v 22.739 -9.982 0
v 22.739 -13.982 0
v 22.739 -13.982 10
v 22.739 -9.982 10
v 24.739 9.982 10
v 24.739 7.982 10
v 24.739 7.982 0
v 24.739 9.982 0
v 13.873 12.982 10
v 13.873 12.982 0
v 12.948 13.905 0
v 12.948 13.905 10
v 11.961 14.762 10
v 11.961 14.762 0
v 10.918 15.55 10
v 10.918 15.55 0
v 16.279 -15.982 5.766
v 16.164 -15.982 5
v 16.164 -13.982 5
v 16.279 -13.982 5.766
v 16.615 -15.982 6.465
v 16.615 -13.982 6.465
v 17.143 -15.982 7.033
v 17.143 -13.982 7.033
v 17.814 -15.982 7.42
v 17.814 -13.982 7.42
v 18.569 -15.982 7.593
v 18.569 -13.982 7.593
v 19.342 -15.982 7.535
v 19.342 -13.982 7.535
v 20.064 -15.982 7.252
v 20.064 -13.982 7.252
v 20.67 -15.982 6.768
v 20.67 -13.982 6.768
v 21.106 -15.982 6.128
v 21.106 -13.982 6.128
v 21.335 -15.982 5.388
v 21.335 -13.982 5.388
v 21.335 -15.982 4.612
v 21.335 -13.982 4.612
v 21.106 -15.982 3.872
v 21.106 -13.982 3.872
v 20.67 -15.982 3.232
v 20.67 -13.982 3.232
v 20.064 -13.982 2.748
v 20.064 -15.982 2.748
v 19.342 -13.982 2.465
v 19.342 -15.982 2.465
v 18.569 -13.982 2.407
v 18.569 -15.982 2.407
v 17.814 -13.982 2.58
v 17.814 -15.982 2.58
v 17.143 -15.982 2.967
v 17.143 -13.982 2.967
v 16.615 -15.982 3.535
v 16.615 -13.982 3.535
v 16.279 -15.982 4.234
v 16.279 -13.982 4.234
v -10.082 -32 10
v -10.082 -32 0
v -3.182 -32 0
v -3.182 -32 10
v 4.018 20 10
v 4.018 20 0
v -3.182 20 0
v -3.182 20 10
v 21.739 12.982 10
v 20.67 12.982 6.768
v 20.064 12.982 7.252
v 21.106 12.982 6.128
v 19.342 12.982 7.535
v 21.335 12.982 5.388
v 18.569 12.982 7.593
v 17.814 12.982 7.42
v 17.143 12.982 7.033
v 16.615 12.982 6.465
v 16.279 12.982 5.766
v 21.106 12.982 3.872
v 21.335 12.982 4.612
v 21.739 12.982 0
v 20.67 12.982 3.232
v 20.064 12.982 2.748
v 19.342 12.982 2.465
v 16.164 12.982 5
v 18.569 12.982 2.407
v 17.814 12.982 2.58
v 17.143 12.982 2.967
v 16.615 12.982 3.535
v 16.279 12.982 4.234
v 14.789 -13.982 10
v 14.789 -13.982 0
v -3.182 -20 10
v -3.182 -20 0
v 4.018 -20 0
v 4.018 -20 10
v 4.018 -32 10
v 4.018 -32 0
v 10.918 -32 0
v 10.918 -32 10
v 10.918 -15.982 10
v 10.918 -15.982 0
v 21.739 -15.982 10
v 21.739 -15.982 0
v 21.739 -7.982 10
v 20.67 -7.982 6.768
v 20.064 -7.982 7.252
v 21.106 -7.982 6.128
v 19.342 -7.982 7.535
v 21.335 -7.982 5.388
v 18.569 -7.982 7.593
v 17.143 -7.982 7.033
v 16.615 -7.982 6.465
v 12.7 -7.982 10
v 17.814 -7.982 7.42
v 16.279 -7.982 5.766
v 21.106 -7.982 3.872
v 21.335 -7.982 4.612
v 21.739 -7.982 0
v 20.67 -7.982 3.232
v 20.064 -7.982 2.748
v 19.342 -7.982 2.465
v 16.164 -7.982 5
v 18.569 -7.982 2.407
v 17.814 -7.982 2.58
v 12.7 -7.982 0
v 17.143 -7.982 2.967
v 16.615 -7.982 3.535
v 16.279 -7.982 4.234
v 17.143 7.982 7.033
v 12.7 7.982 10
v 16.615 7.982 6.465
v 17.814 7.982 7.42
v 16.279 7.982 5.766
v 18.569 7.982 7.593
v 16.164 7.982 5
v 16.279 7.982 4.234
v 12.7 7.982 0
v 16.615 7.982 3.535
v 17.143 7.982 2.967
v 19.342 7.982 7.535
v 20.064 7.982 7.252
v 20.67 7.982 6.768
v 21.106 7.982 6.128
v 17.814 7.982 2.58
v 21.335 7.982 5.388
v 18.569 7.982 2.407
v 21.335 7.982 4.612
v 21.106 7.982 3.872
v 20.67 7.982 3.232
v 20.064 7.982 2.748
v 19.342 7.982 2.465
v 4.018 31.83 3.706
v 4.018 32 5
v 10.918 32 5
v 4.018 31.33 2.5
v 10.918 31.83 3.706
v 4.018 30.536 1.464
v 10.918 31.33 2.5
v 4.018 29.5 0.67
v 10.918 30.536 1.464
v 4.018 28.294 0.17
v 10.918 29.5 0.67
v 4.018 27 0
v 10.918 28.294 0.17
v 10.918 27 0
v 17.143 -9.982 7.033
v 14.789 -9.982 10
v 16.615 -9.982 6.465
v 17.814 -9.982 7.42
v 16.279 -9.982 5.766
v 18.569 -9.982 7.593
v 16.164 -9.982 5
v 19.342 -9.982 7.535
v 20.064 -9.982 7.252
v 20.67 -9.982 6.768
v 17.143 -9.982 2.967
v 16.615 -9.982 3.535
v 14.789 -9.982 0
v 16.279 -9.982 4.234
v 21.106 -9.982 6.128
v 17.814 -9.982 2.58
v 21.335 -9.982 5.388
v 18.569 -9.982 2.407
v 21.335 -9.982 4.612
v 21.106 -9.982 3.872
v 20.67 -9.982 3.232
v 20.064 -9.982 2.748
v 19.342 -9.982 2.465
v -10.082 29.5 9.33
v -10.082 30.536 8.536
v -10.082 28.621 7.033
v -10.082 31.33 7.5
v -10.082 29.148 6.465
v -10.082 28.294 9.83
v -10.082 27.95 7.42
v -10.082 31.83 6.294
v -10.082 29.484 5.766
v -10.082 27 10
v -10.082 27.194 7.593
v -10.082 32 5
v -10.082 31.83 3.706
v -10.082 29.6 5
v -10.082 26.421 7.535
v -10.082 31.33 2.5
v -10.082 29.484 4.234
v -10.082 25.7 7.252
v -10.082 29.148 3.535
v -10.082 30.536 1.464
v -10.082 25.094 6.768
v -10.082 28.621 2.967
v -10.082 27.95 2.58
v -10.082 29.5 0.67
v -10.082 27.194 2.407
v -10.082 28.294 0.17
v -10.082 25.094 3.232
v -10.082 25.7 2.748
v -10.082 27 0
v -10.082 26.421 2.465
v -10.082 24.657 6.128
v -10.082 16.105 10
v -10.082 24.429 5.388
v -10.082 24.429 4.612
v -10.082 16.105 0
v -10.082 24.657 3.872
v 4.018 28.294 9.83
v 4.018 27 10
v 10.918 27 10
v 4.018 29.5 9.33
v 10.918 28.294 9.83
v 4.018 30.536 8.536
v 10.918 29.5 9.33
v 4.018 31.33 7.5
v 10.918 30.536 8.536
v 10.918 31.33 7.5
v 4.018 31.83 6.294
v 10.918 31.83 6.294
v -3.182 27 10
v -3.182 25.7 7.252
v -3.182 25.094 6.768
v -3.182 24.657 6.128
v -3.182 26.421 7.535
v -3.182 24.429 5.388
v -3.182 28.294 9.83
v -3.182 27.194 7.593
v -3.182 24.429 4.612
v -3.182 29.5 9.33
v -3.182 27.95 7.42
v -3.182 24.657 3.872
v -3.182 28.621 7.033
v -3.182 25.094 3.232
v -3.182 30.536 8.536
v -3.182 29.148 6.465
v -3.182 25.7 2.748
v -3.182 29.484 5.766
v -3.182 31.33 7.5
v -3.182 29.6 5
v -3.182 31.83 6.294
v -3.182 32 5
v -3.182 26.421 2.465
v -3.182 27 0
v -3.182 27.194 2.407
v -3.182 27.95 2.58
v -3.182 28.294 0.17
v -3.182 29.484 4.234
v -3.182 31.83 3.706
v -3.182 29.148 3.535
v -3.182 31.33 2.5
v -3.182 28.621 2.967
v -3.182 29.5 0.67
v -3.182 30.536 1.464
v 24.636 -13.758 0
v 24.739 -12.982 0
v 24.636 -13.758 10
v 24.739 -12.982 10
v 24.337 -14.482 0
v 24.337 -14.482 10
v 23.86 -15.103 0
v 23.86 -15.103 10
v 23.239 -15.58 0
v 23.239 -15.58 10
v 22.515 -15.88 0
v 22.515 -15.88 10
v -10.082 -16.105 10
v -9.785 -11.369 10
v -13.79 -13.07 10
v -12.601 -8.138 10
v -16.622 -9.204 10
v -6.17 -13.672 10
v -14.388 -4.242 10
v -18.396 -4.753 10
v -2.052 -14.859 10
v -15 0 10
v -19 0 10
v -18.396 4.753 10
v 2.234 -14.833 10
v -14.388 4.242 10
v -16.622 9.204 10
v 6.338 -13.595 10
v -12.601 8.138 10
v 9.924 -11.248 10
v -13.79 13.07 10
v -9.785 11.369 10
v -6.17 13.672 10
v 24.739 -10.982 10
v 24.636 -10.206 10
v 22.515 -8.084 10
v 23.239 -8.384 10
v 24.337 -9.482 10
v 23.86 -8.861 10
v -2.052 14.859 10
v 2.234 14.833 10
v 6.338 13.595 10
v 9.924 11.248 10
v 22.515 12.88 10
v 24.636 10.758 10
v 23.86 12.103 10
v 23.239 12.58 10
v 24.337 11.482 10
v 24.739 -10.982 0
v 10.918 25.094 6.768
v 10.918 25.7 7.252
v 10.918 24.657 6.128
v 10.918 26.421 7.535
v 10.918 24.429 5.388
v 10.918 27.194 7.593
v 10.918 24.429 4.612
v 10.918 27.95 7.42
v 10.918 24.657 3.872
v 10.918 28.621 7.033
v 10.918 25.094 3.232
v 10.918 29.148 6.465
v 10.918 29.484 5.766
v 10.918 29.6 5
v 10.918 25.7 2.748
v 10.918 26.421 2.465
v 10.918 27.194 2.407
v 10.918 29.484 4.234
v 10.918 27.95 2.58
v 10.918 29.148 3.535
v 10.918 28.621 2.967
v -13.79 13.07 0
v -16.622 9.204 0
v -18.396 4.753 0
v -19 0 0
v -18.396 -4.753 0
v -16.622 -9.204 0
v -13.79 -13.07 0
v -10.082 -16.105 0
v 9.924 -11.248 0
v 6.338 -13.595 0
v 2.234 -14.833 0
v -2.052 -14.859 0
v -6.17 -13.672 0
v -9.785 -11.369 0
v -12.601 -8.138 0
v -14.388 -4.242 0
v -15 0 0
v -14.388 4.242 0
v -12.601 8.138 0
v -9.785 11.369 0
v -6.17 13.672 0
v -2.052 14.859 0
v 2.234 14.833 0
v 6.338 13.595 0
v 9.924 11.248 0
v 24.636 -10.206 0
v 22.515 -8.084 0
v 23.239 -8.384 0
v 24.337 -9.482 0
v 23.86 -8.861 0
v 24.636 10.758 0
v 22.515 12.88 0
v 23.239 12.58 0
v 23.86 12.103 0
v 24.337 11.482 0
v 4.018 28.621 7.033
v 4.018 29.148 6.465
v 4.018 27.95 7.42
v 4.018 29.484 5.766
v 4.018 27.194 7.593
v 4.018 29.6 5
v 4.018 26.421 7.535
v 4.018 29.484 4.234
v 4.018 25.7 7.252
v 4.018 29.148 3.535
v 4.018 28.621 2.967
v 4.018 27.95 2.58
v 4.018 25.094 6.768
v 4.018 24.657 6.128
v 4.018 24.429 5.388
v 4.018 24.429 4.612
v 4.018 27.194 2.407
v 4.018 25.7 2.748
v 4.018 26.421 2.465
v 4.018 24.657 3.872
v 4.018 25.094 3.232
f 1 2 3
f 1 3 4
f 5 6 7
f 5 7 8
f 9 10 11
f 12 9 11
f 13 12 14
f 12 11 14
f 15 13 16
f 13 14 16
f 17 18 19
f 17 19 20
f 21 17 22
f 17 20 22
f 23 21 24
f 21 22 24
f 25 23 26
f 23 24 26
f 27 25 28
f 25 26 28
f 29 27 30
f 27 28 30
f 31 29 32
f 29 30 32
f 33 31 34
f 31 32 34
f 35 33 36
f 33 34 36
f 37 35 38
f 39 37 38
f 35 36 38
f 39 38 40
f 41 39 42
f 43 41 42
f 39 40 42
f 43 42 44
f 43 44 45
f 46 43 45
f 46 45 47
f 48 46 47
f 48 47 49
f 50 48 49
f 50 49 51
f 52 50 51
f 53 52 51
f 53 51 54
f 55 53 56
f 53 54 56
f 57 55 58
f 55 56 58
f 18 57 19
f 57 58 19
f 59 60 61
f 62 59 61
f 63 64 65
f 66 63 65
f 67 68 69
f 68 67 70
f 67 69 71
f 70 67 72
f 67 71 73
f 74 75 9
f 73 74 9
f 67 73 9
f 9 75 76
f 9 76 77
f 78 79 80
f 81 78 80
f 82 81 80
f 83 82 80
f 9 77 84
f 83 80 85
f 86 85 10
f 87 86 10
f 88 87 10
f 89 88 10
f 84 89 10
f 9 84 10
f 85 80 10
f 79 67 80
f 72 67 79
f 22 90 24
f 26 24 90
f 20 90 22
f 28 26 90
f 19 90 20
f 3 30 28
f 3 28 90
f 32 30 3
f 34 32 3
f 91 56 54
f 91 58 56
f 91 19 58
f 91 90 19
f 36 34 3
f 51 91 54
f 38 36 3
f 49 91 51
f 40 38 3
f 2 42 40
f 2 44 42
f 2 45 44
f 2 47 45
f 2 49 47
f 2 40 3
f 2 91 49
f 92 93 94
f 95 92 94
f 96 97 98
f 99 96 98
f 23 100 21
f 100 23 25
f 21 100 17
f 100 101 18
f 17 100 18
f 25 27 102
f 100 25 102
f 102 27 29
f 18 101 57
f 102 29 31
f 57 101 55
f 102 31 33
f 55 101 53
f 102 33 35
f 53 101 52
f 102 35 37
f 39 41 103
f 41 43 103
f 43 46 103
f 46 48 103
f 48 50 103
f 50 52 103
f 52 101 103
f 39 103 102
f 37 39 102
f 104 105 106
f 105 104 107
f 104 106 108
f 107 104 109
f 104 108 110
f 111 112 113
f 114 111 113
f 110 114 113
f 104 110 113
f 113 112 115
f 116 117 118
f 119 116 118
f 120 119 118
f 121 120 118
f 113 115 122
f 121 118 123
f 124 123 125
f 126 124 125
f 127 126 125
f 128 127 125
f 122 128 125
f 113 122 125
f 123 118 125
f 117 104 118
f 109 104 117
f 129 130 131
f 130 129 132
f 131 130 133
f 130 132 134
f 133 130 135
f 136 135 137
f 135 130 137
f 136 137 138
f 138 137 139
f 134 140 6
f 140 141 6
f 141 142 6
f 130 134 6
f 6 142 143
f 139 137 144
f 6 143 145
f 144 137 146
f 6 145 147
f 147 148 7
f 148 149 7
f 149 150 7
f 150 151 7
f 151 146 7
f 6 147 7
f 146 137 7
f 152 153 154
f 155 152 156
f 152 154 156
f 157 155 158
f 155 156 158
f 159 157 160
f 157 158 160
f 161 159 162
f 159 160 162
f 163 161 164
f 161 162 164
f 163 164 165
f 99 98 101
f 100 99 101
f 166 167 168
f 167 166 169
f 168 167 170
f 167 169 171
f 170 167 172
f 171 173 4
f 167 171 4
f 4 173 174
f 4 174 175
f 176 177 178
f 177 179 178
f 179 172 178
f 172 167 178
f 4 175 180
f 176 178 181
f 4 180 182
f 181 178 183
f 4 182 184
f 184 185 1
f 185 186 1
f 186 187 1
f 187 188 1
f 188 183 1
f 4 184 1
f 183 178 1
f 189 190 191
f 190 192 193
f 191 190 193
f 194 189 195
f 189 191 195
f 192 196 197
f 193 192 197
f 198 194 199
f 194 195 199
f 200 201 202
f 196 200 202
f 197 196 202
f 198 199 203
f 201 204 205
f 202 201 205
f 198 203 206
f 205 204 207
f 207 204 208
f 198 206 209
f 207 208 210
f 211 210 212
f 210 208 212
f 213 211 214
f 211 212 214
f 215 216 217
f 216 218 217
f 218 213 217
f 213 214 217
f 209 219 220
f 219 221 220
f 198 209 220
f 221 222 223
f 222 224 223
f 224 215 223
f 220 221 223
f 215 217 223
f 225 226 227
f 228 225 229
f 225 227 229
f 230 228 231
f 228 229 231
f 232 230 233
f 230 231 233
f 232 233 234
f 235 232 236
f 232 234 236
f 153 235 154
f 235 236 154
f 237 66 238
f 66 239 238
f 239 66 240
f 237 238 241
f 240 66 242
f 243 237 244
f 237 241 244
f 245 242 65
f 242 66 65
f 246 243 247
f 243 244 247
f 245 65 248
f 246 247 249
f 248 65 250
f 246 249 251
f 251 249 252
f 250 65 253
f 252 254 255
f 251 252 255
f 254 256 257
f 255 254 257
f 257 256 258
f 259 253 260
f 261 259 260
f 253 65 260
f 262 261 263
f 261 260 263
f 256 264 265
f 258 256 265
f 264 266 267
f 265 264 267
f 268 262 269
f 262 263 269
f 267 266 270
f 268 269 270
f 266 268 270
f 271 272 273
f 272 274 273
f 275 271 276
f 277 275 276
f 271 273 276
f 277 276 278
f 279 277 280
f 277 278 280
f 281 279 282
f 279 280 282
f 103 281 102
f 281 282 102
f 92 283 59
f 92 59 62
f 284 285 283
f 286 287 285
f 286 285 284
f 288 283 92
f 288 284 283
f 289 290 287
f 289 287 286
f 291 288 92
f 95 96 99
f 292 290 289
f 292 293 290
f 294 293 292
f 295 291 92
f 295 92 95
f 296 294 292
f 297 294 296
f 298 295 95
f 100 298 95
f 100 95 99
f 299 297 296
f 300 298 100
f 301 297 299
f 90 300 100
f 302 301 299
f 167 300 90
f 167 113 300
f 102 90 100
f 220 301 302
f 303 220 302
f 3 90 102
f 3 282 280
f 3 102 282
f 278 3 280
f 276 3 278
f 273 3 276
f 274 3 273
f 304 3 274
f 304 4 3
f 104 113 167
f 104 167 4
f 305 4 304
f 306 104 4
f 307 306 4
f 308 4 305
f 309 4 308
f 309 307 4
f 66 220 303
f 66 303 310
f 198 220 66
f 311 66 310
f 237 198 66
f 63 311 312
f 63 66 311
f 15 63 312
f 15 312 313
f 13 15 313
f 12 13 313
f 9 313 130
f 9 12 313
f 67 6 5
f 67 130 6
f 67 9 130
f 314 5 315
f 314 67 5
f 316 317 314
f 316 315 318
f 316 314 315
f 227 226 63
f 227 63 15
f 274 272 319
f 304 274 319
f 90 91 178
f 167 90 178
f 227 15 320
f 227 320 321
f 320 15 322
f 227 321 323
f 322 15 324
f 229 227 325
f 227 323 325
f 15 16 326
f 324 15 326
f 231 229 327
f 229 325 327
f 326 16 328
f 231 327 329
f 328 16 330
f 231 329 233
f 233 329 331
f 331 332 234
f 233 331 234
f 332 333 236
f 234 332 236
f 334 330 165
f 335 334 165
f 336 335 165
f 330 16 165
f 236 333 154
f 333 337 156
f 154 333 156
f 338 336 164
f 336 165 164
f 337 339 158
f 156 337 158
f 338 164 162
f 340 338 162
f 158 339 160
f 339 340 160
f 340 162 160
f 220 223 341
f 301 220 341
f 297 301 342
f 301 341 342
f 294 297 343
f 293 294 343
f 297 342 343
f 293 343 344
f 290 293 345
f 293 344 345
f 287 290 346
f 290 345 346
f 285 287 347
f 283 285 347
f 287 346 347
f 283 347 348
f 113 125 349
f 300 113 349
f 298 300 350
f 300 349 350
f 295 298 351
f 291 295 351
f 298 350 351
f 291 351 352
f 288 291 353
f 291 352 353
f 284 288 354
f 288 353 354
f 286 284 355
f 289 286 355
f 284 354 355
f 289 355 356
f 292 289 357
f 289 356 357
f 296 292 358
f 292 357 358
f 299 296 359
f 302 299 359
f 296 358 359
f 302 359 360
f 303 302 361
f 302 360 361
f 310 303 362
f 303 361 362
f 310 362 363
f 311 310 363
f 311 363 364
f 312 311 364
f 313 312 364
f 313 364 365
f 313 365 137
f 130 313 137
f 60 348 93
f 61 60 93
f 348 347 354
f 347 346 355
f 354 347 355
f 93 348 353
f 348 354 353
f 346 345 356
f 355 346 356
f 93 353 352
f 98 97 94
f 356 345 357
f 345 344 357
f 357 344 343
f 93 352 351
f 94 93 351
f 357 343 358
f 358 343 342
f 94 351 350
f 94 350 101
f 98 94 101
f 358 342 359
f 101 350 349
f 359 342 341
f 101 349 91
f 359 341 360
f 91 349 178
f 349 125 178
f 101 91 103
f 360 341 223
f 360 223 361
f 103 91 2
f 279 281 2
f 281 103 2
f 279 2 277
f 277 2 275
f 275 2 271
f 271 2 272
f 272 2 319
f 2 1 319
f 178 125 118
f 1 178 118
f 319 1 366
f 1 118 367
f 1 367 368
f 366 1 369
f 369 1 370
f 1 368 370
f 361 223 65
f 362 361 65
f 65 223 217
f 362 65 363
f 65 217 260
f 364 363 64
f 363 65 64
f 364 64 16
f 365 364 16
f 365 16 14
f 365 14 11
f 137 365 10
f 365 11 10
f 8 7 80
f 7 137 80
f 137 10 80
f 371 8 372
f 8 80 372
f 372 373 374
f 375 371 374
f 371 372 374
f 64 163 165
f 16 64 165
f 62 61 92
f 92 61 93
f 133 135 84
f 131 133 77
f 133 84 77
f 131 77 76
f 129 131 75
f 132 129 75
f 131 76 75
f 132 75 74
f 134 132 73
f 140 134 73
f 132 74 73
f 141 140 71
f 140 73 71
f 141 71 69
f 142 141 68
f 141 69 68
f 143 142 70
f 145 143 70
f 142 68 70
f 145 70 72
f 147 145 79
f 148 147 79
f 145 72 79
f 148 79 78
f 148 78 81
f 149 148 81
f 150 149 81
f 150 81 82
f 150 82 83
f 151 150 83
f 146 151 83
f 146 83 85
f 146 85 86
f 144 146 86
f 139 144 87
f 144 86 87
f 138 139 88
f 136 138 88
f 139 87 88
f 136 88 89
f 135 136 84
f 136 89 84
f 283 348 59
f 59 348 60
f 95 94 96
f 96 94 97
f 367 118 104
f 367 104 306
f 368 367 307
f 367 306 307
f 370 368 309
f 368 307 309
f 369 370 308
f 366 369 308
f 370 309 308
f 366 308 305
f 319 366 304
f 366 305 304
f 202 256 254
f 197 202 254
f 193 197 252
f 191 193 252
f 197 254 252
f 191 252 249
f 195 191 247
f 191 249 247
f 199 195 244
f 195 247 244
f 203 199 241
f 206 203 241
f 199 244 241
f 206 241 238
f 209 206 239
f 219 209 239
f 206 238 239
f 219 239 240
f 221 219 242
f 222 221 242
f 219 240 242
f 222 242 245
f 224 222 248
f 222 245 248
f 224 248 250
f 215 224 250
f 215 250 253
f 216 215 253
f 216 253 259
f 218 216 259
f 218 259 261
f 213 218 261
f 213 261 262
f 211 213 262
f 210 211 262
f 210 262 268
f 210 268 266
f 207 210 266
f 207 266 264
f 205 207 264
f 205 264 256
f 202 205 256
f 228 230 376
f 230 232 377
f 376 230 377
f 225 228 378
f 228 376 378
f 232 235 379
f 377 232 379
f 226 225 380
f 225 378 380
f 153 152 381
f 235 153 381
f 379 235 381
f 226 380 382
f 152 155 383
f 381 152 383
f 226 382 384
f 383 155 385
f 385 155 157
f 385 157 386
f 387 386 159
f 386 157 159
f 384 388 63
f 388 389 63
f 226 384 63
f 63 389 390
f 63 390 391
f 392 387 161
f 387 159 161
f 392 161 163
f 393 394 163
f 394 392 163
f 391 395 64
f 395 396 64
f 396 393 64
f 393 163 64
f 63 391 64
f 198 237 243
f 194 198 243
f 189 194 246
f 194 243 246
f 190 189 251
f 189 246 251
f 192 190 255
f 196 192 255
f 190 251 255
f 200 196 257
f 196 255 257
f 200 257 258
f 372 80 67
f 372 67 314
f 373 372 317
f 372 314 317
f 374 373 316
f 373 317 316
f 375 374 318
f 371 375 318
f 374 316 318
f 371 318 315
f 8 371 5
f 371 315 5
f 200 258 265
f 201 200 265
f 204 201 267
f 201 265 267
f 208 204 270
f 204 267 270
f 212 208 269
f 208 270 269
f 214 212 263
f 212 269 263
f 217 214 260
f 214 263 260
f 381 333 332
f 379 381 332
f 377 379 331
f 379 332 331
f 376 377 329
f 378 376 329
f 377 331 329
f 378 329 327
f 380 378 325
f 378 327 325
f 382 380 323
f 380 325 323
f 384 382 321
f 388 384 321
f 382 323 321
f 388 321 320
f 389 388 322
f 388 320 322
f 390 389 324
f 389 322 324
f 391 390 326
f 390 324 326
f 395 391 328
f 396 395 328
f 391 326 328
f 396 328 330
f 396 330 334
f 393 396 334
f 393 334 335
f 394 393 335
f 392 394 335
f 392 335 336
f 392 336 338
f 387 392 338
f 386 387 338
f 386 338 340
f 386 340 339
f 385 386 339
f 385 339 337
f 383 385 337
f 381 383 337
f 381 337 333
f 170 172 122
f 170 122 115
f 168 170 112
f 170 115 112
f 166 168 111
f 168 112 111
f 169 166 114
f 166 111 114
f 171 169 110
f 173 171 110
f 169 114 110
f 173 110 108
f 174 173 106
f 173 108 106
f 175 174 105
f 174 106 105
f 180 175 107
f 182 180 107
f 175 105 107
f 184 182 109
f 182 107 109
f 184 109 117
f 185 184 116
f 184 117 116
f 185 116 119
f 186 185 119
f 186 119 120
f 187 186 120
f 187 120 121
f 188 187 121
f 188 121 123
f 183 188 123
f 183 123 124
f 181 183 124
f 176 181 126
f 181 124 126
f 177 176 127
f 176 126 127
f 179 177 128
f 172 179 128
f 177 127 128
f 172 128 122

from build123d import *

# Parameters (mm, degrees)
F0_W     = 7.95
F0_H     = 4
F1_DEPTH = 10
F2_R     = 2.6
F3_DEPTH = 21
F4_R     = 2.6
F5_DEPTH = 50
F6_R     = 3


with BuildPart() as f1:
    # F0 (on Top) → F1 (new body)
    with BuildSketch(Plane.XY):
        with BuildLine():
            Line((24.738697, 12.982003), (13.873269, 12.982003))
            ThreePointArc((13.873269, 12.982003), (12.462028, 14.342171), (10.918168, 15.549714))
            Line((10.918168, 15.549714), (10.918168, 32))
            Line((10.918168, 32), (4.018168, 32))
            Line((4.018168, 32), (4.018168, 20))
            Line((4.018168, 20), (-3.181832, 20))
            Line((-3.181832, 20), (-3.181832, 32))
            Line((-3.181832, 32), (-10.081832, 32))
            Line((-10.081832, 32), (-10.081832, 16.104554))
            ThreePointArc((-10.081832, 16.104554), (-19, 0), (-10.081832, -16.104554))
            ThreePointArc((-10.081832, -16.104554), (-6.760669, -17.756502), (-3.181832, -18.731683))
            ThreePointArc((-3.181832, -18.731683), (0.425887, -18.995226), (4.018168, -18.570254))
            ThreePointArc((4.018168, -18.570254), (7.26281, -17.557095), (10.274998, -15.982003))
            Line((10.274998, -15.982003), (10.918168, -15.982003))
            Line((10.918168, -15.982003), (12.699907, -15.982003))
            Line((12.699907, -15.982003), (24.738697, -15.982003))
            Line((24.738697, -15.982003), (24.738697, -7.982003))
            Line((24.738697, -7.982003), (12.699907, -7.982003))
            ThreePointArc((12.699907, -7.982003), (-15, 0), (12.699907, 7.982003))
            Line((12.699907, 7.982003), (24.738697, 7.982003))
            Line((24.738697, 7.982003), (24.738697, 12.982003))
        make_face()
        with Locations((18.763697, -11.982003)):
            Rectangle(F0_W, F0_H, mode=Mode.SUBTRACT)
        with BuildLine():
            Line((10.918168, -32), (10.918168, -15.982003))
            Line((10.918168, -15.982003), (10.274998, -15.982003))
            ThreePointArc((10.274998, -15.982003), (7.26281, -17.557095), (4.018168, -18.570254))
            Line((4.018168, -18.570254), (4.018168, -20))
            Line((4.018168, -20), (4.018168, -32))
            Line((4.018168, -32), (10.918168, -32))
        make_face()
        with BuildLine():
            ThreePointArc((-3.181832, -18.731683), (-6.760669, -17.756502), (-10.081832, -16.104554))
            Line((-10.081832, -16.104554), (-10.081832, -32))
            Line((-10.081832, -32), (-3.181832, -32))
            Line((-3.181832, -32), (-3.181832, -20))
            Line((-3.181832, -20), (-3.181832, -18.731683))
        make_face()
        with BuildLine():
            ThreePointArc((4.018168, -18.570254), (0.425887, -18.995226), (-3.181832, -18.731683))
            Line((-3.181832, -18.731683), (-3.181832, -20))
            Line((-3.181832, -20), (4.018168, -20))
            Line((4.018168, -20), (4.018168, -18.570254))
        make_face()
    extrude(amount=F1_DEPTH)

    # F2 (on face) → F3 (cut, through all)
    with BuildSketch(Plane.YZ.offset(10.918168)):
        with BuildLine():
            ThreePointArc((32, 5), (30.535534, 1.464466), (27, 0))
            Line((27, 0), (32, 0))
            Line((32, 0), (32, 5))
        make_face()
        with BuildLine():
            ThreePointArc((27, 10), (30.535534, 8.535534), (32, 5))
            Line((32, 5), (32, 10))
            Line((32, 10), (27, 10))
        make_face()
        with Locations((27, 5)):
            Circle(F2_R)
    extrude(amount=-F3_DEPTH, mode=Mode.SUBTRACT)

    # F4 (on face) → F5 (cut, symmetric)
    with BuildSketch(Plane(origin=(0, -13.982003, 0), x_dir=(-1, 0, 0), z_dir=(0, 1, 0))):
        with Locations((-18.763697, 5)):
            Circle(F4_R)
    extrude(amount=F5_DEPTH, both=True, mode=Mode.SUBTRACT)

    # F6
    f6_edges = [f1.edges().sort_by_distance(p)[0] for p in [
        (24.738697, 12.982003, 5),
        (24.738697, -7.982003, 5),
        (24.738697, -15.982003, 5),
    ]]
    fillet(f6_edges, radius=F6_R)


solid = f1.part
